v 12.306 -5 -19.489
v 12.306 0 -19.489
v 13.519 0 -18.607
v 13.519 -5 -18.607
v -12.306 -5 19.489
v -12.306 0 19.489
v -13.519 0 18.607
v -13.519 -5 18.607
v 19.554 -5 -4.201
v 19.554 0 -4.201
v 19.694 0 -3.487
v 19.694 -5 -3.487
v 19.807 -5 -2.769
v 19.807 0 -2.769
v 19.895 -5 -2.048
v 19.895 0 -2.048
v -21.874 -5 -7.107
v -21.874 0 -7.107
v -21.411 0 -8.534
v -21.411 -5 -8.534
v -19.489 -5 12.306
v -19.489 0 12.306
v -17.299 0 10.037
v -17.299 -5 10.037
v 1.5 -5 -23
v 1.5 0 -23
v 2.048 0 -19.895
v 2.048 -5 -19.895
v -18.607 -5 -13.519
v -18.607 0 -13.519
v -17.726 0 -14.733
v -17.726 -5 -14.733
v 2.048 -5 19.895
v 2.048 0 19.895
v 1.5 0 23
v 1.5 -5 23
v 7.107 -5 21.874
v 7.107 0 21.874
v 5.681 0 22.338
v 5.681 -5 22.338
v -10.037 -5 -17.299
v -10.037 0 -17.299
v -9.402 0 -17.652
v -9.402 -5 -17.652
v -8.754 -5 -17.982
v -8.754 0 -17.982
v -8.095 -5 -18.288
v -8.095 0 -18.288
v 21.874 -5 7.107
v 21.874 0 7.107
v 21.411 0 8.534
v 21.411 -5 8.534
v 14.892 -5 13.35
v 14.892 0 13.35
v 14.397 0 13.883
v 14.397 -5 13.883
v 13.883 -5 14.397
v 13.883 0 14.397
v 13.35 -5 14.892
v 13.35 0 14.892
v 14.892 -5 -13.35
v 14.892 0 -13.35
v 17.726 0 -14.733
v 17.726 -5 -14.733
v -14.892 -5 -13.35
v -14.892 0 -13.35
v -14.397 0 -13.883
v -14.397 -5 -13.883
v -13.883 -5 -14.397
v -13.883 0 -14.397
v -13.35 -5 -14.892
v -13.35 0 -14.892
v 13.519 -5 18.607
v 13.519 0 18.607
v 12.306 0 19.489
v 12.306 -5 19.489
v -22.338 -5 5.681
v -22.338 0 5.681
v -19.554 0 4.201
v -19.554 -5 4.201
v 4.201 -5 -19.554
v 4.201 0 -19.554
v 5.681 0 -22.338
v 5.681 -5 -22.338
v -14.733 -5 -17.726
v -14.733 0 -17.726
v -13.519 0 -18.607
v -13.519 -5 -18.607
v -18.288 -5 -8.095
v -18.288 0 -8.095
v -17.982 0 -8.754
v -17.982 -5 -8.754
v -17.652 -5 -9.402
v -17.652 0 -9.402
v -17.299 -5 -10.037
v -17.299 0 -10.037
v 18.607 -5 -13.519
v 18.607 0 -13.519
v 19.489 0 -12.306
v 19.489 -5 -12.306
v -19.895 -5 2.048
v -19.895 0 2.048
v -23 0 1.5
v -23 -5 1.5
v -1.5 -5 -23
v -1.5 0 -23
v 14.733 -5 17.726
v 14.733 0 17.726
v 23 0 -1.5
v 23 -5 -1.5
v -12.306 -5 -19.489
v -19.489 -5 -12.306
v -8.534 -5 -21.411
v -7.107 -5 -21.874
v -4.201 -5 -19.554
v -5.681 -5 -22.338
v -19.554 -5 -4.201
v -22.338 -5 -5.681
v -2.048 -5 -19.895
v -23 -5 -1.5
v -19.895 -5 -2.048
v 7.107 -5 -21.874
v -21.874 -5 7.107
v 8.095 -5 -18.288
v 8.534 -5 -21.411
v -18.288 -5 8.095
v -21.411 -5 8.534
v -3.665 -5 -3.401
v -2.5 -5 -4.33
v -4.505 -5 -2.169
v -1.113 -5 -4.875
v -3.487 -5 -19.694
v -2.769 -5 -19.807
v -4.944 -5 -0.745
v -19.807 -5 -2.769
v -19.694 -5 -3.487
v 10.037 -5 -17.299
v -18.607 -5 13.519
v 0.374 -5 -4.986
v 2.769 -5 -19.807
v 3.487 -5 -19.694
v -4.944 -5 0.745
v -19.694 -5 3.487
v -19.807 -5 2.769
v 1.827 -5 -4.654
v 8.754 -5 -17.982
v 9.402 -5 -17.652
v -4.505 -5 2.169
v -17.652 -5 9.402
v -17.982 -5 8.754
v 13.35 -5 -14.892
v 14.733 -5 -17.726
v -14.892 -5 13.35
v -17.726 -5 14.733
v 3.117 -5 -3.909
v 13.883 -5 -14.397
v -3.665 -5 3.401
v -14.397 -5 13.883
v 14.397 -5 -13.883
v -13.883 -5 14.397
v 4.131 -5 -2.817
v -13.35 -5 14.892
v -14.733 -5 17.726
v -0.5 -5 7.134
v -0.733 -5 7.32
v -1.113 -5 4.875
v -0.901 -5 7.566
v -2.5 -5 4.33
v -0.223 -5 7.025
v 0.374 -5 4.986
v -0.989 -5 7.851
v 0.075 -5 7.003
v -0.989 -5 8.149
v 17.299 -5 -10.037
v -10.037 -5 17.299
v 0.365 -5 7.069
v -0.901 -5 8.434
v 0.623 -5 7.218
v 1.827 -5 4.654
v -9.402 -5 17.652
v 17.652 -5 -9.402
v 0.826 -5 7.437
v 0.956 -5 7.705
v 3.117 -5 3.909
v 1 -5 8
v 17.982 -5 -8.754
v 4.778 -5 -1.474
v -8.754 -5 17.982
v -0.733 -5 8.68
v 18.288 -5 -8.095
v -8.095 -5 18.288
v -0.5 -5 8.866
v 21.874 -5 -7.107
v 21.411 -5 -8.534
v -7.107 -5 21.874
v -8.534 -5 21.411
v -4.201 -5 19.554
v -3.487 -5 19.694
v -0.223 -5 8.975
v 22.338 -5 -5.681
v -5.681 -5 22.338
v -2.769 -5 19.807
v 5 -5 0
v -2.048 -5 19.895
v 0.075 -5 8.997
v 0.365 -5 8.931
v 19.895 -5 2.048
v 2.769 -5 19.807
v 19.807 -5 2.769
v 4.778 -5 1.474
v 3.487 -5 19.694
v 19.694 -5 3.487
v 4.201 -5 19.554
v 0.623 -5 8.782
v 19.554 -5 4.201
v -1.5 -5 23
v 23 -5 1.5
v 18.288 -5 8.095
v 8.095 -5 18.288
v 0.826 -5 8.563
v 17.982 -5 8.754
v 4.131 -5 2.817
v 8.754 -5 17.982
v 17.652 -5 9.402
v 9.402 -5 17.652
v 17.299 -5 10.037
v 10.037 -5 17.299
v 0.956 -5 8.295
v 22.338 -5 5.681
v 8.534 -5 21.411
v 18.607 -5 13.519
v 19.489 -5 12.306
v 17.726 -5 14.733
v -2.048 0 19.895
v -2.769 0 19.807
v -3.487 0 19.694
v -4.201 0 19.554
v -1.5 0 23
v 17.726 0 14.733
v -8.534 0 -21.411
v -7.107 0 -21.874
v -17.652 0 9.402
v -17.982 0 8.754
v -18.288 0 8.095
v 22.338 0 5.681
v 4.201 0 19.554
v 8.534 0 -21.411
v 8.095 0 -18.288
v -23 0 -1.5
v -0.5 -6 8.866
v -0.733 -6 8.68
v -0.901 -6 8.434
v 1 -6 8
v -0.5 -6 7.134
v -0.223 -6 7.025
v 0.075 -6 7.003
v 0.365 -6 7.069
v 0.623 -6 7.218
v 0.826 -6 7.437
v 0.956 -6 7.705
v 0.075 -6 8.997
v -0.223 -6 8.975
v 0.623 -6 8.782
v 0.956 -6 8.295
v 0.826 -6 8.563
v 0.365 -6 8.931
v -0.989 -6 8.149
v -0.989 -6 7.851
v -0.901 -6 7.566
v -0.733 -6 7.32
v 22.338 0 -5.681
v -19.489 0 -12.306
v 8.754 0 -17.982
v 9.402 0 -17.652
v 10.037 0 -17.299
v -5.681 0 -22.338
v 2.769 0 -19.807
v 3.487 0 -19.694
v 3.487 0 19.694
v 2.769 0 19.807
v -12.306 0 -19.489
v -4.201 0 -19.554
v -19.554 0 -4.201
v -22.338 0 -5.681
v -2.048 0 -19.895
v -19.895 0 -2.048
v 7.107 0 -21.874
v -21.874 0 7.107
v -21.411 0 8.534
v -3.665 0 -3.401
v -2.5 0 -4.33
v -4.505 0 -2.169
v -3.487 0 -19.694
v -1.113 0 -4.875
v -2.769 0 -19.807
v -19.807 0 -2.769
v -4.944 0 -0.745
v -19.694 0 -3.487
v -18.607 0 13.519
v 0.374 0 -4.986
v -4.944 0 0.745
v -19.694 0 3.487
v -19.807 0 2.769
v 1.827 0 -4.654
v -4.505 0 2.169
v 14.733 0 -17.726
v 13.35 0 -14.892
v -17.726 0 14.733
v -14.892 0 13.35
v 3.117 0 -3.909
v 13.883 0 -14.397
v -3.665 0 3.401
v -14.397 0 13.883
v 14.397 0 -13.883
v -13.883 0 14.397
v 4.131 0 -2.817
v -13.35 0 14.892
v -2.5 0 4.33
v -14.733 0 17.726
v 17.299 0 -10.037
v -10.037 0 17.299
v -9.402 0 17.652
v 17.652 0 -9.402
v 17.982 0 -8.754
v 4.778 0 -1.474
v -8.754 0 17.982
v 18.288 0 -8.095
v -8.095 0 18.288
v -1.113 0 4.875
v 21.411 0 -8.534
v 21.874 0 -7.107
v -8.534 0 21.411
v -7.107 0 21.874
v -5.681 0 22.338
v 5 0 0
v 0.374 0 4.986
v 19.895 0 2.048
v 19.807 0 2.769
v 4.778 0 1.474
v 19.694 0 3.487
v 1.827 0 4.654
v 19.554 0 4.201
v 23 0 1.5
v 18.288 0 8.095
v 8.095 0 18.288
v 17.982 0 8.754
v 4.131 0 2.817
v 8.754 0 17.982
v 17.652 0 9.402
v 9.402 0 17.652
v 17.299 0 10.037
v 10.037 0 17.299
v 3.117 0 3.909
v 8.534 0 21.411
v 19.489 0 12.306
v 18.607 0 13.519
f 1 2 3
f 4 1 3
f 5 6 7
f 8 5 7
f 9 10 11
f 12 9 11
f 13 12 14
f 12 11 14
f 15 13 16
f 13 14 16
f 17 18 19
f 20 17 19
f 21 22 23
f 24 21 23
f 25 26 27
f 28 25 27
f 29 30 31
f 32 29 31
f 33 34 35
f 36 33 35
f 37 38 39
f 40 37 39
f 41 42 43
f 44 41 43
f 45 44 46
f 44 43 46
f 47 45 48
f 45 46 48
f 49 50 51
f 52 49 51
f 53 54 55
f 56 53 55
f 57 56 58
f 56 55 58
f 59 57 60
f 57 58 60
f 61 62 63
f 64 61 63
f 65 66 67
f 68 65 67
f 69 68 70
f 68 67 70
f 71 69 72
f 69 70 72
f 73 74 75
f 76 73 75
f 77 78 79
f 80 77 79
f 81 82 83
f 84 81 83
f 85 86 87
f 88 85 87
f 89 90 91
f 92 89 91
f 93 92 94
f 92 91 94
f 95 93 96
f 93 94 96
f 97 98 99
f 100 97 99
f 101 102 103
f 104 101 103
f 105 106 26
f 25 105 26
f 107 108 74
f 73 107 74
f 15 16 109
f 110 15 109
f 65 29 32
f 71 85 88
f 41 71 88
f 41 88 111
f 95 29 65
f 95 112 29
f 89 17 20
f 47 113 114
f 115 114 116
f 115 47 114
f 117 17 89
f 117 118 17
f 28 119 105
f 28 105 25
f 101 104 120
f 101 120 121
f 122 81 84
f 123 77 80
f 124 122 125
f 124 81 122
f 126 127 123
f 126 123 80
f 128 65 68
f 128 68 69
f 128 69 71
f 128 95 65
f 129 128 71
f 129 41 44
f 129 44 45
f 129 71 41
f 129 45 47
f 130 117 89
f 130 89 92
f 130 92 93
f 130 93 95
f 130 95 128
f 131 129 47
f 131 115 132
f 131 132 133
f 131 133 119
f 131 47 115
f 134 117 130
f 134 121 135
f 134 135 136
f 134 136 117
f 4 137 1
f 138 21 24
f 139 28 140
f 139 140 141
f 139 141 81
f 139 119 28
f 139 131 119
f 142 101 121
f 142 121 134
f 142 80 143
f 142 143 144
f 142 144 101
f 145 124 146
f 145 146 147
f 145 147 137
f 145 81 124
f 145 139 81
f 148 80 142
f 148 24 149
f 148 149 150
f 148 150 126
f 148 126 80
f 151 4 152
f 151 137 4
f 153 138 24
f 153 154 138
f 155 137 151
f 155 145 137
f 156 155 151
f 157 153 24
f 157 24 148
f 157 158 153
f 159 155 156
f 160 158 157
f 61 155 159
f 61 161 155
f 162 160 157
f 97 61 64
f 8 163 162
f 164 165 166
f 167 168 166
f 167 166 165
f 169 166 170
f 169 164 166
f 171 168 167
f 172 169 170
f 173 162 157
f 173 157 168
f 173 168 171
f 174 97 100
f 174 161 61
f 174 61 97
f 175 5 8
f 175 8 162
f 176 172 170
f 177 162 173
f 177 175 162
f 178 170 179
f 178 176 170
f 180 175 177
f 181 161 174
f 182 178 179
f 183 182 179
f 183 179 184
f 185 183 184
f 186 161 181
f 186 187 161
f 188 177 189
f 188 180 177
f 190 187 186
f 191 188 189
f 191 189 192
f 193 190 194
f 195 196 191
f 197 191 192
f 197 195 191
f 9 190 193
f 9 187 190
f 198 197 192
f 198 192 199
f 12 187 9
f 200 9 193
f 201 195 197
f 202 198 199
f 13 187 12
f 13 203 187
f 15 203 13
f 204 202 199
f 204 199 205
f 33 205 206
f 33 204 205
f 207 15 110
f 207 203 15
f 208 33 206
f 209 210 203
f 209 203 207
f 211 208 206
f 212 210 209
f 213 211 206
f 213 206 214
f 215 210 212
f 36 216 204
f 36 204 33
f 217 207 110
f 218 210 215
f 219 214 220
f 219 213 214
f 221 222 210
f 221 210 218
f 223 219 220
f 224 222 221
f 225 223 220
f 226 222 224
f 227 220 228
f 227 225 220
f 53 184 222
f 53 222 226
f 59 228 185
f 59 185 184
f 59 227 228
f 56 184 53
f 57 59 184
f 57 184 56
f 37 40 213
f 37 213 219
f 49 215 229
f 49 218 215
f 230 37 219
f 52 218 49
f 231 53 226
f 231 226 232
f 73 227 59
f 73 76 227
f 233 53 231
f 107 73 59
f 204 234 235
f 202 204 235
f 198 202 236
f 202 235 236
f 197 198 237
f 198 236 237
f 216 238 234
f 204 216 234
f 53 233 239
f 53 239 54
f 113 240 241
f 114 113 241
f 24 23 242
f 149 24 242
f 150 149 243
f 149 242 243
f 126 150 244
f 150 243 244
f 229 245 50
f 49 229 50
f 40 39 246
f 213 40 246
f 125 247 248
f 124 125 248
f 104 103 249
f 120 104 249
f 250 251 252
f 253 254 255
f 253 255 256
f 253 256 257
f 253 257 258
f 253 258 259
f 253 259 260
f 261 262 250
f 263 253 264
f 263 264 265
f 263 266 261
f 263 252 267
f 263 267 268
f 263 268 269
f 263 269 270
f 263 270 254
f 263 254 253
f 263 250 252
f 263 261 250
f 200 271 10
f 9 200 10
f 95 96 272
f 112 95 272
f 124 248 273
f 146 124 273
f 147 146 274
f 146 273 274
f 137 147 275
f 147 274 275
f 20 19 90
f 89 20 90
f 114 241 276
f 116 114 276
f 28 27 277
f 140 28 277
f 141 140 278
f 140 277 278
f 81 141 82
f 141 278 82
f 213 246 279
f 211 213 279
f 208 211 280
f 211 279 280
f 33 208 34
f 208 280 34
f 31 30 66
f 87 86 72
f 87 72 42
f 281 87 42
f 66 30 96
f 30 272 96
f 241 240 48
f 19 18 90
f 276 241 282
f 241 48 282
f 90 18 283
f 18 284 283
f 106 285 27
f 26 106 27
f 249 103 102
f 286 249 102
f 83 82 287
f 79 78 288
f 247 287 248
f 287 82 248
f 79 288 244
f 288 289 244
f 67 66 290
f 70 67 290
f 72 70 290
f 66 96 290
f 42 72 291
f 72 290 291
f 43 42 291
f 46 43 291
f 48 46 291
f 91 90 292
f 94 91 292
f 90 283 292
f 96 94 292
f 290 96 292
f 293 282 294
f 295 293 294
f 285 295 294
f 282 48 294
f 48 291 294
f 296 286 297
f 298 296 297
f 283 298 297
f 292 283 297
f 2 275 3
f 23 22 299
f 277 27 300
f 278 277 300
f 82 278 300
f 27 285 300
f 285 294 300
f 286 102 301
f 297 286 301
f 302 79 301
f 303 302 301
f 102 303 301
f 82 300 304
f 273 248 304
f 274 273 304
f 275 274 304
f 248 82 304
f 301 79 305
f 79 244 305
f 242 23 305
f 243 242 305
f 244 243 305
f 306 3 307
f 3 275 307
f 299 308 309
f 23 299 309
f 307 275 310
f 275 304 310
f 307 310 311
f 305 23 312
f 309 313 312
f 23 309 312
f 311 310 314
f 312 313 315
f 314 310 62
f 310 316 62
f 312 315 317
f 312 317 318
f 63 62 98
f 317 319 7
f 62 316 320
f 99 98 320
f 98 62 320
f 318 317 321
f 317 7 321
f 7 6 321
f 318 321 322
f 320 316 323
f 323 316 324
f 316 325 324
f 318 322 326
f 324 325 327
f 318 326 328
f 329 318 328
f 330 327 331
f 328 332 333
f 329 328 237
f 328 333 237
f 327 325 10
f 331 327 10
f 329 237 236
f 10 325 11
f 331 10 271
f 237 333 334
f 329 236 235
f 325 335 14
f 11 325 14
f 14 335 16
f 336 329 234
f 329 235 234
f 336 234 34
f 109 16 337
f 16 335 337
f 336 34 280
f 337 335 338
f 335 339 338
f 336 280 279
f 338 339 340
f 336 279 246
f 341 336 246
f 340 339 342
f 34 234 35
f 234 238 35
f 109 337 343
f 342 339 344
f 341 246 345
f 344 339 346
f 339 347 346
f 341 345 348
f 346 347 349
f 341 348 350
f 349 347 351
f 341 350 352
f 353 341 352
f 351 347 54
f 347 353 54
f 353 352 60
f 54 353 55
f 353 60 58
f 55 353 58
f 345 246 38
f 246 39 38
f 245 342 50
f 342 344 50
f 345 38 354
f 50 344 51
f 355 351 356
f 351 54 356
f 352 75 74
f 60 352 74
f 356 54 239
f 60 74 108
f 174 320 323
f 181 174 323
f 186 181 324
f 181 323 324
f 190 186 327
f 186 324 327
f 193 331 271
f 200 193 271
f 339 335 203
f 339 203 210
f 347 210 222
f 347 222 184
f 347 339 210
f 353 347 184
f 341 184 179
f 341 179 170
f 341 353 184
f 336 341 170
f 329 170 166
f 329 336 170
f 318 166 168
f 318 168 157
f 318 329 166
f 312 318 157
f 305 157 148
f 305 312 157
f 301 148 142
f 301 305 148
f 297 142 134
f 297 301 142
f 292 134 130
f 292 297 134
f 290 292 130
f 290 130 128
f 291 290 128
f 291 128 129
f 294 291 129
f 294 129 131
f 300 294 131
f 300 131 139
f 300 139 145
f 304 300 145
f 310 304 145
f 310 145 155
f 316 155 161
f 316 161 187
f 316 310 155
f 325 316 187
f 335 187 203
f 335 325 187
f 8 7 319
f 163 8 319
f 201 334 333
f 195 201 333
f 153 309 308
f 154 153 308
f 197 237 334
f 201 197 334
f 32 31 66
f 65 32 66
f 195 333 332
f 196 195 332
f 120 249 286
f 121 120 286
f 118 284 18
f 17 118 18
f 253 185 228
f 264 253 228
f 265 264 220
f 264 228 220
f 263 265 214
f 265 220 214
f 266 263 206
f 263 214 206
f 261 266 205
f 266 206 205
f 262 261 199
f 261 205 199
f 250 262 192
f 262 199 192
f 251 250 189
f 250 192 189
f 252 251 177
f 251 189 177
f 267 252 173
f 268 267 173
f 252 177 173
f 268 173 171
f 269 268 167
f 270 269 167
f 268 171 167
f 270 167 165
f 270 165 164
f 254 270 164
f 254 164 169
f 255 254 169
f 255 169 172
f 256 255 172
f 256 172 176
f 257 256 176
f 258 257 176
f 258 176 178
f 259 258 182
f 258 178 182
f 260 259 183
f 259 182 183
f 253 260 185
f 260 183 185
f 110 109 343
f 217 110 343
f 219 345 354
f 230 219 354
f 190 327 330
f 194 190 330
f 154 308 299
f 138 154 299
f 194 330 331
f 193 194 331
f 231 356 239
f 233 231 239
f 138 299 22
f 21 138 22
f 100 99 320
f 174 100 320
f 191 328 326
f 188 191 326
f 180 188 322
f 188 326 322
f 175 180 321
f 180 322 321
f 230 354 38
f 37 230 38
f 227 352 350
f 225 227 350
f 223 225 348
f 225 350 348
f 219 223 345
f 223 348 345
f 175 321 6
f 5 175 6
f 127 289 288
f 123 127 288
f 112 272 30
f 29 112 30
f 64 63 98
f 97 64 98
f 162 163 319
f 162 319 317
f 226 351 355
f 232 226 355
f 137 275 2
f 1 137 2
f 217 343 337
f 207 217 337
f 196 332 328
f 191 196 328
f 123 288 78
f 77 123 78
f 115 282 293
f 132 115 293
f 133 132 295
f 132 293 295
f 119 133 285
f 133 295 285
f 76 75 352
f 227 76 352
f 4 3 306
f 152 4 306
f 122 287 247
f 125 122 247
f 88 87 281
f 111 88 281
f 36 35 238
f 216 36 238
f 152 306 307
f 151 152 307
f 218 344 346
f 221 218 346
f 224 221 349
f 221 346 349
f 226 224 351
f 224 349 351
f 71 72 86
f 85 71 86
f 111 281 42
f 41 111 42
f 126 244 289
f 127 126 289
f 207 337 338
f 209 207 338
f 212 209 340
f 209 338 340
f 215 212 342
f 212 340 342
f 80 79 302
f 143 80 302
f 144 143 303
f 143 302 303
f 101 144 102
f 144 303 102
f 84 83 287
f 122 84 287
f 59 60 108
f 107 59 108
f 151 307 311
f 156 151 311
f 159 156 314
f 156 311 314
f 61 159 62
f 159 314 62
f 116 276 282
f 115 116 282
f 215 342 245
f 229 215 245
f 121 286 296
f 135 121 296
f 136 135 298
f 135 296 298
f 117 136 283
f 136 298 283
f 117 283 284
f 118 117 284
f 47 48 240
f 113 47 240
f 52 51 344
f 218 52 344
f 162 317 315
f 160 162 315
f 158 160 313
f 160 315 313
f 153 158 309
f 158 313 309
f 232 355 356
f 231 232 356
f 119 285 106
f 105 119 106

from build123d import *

# Parameters (mm, degrees)
F0_R     = 5
F1_DEPTH = 5
F2_R     = 1
F3_DEPTH = 1


with BuildPart() as f1:
    # F0 (on Front) → F1 (new body)
    with BuildSketch(Plane.XZ):
        with BuildLine():
            ThreePointArc((19.894917, -2.04751), (19.973712, -1.025102), (20, 0))
            ThreePointArc((20, 0), (19.973712, 1.025102), (19.894917, 2.04751))
            ThreePointArc((19.894917, 2.04751), (19.753767, 3.128689), (19.553905, 4.20057))
            ThreePointArc((19.553905, 4.20057), (19.02113, 6.18034), (18.288475, 8.095165))
            ThreePointArc((18.288475, 8.095165), (17.82013, 9.07981), (17.298822, 10.037468))
            ThreePointArc((17.298822, 10.037468), (16.18034, 11.755705), (14.891829, 13.350409))
            ThreePointArc((14.891829, 13.350409), (14.142136, 14.142136), (13.350409, 14.891829))
            ThreePointArc((13.350409, 14.891829), (11.755705, 16.18034), (10.037468, 17.298822))
            ThreePointArc((10.037468, 17.298822), (9.07981, 17.82013), (8.095165, 18.288475))
            ThreePointArc((8.095165, 18.288475), (6.18034, 19.02113), (4.20057, 19.553905))
            ThreePointArc((4.20057, 19.553905), (3.128689, 19.753767), (2.04751, 19.894917))
            ThreePointArc((2.04751, 19.894917), (0, 20), (-2.04751, 19.894917))
            ThreePointArc((-2.04751, 19.894917), (-3.128689, 19.753767), (-4.20057, 19.553905))
            ThreePointArc((-4.20057, 19.553905), (-6.18034, 19.02113), (-8.095165, 18.288475))
            ThreePointArc((-8.095165, 18.288475), (-9.07981, 17.82013), (-10.037468, 17.298822))
            ThreePointArc((-10.037468, 17.298822), (-11.755705, 16.18034), (-13.350409, 14.891829))
            ThreePointArc((-13.350409, 14.891829), (-14.142136, 14.142136), (-14.891829, 13.350409))
            ThreePointArc((-14.891829, 13.350409), (-16.18034, 11.755705), (-17.298822, 10.037468))
            ThreePointArc((-17.298822, 10.037468), (-17.82013, 9.07981), (-18.288475, 8.095165))
            ThreePointArc((-18.288475, 8.095165), (-19.02113, 6.18034), (-19.553905, 4.20057))
            ThreePointArc((-19.553905, 4.20057), (-19.753767, 3.128689), (-19.894917, 2.04751))
            ThreePointArc((-19.894917, 2.04751), (-20, 0), (-19.894917, -2.04751))
            ThreePointArc((-19.894917, -2.04751), (-19.753767, -3.128689), (-19.553905, -4.20057))
            ThreePointArc((-19.553905, -4.20057), (-19.02113, -6.18034), (-18.288475, -8.095165))
            ThreePointArc((-18.288475, -8.095165), (-17.82013, -9.07981), (-17.298822, -10.037468))
            ThreePointArc((-17.298822, -10.037468), (-16.18034, -11.755705), (-14.891829, -13.350409))
            ThreePointArc((-14.891829, -13.350409), (-14.142136, -14.142136), (-13.350409, -14.891829))
            ThreePointArc((-13.350409, -14.891829), (-11.755705, -16.18034), (-10.037468, -17.298822))
            ThreePointArc((-10.037468, -17.298822), (-9.07981, -17.82013), (-8.095165, -18.288475))
            ThreePointArc((-8.095165, -18.288475), (-6.18034, -19.02113), (-4.20057, -19.553905))
            ThreePointArc((-4.20057, -19.553905), (-3.128689, -19.753767), (-2.04751, -19.894917))
            ThreePointArc((-2.04751, -19.894917), (0, -20), (2.04751, -19.894917))
            ThreePointArc((2.04751, -19.894917), (3.128689, -19.753767), (4.20057, -19.553905))
            ThreePointArc((4.20057, -19.553905), (6.18034, -19.02113), (8.095165, -18.288475))
            ThreePointArc((8.095165, -18.288475), (9.07981, -17.82013), (10.037468, -17.298822))
            ThreePointArc((10.037468, -17.298822), (11.755705, -16.18034), (13.350409, -14.891829))
            ThreePointArc((13.350409, -14.891829), (14.142136, -14.142136), (14.891829, -13.350409))
            ThreePointArc((14.891829, -13.350409), (16.18034, -11.755705), (17.298822, -10.037468))
            ThreePointArc((17.298822, -10.037468), (17.82013, -9.07981), (18.288475, -8.095165))
            ThreePointArc((18.288475, -8.095165), (19.02113, -6.18034), (19.553905, -4.20057))
            ThreePointArc((19.553905, -4.20057), (19.753767, -3.128689), (19.894917, -2.04751))
        make_face()
        Circle(F0_R, mode=Mode.SUBTRACT)
        with BuildLine():
            ThreePointArc((19.894917, 2.04751), (19.973712, 1.025102), (20, 0))
            ThreePointArc((20, 0), (19.973712, -1.025102), (19.894917, -2.04751))
            Line((19.894917, -2.04751), (23, -1.5))
            Line((23, -1.5), (23, 0))
            Line((23, 0), (23, 1.5))
            Line((23, 1.5), (19.894917, 2.04751))
        make_face()
        with BuildLine():
            ThreePointArc((18.288475, 8.095165), (19.02113, 6.18034), (19.553905, 4.20057))
            Line((19.553905, 4.20057), (22.337825, 5.680806))
            Line((22.337825, 5.680806), (21.8743, 7.107391))
            Line((21.8743, 7.107391), (21.410774, 8.533976))
            Line((21.410774, 8.533976), (18.288475, 8.095165))
        make_face()
        with BuildLine():
            Line((22.337825, -5.680806), (19.553905, -4.20057))
            ThreePointArc((19.553905, -4.20057), (19.02113, -6.18034), (18.288475, -8.095165))
            Line((18.288475, -8.095165), (21.410774, -8.533976))
            Line((21.410774, -8.533976), (21.8743, -7.107391))
            Line((21.8743, -7.107391), (22.337825, -5.680806))
        make_face()
        with BuildLine():
            ThreePointArc((14.891829, 13.350409), (16.18034, 11.755705), (17.298822, 10.037468))
            Line((17.298822, 10.037468), (19.489069, 12.305535))
            Line((19.489069, 12.305535), (18.607391, 13.519061))
            Line((18.607391, 13.519061), (17.725713, 14.732586))
            Line((17.725713, 14.732586), (14.891829, 13.350409))
        make_face()
        with BuildLine():
            Line((19.489069, -12.305535), (17.298822, -10.037468))
            ThreePointArc((17.298822, -10.037468), (16.18034, -11.755705), (14.891829, -13.350409))
            Line((14.891829, -13.350409), (17.725713, -14.732586))
            Line((17.725713, -14.732586), (18.607391, -13.519061))
            Line((18.607391, -13.519061), (19.489069, -12.305535))
        make_face()
        with BuildLine():
            ThreePointArc((10.037468, 17.298822), (11.755705, 16.18034), (13.350409, 14.891829))
            Line((13.350409, 14.891829), (14.732586, 17.725713))
            Line((14.732586, 17.725713), (13.519061, 18.607391))
            Line((13.519061, 18.607391), (12.305535, 19.489069))
            Line((12.305535, 19.489069), (10.037468, 17.298822))
        make_face()
        with BuildLine():
            Line((14.732586, -17.725713), (13.350409, -14.891829))
            ThreePointArc((13.350409, -14.891829), (11.755705, -16.18034), (10.037468, -17.298822))
            Line((10.037468, -17.298822), (12.305535, -19.489069))
            Line((12.305535, -19.489069), (13.519061, -18.607391))
            Line((13.519061, -18.607391), (14.732586, -17.725713))
        make_face()
        with BuildLine():
            ThreePointArc((4.20057, 19.553905), (6.18034, 19.02113), (8.095165, 18.288475))
            Line((8.095165, 18.288475), (8.533976, 21.410774))
            Line((8.533976, 21.410774), (7.107391, 21.8743))
            Line((7.107391, 21.8743), (5.680806, 22.337825))
            Line((5.680806, 22.337825), (4.20057, 19.553905))
        make_face()
        with BuildLine():
            Line((8.533976, -21.410774), (8.095165, -18.288475))
            ThreePointArc((8.095165, -18.288475), (6.18034, -19.02113), (4.20057, -19.553905))
            Line((4.20057, -19.553905), (5.680806, -22.337825))
            Line((5.680806, -22.337825), (7.107391, -21.8743))
            Line((7.107391, -21.8743), (8.533976, -21.410774))
        make_face()
        with BuildLine():
            ThreePointArc((-2.04751, 19.894917), (0, 20), (2.04751, 19.894917))
            Line((2.04751, 19.894917), (1.5, 23))
            Line((1.5, 23), (0, 23))
            Line((0, 23), (-1.5, 23))
            Line((-1.5, 23), (-2.04751, 19.894917))
        make_face()
        with BuildLine():
            Line((1.5, -23), (2.04751, -19.894917))
            ThreePointArc((2.04751, -19.894917), (0, -20), (-2.04751, -19.894917))
            Line((-2.04751, -19.894917), (-1.5, -23))
            Line((-1.5, -23), (0, -23))
            Line((0, -23), (1.5, -23))
        make_face()
        with BuildLine():
            ThreePointArc((-8.095165, 18.288475), (-6.18034, 19.02113), (-4.20057, 19.553905))
            Line((-4.20057, 19.553905), (-5.680806, 22.337825))
            Line((-5.680806, 22.337825), (-7.107391, 21.8743))
            Line((-7.107391, 21.8743), (-8.533976, 21.410774))
            Line((-8.533976, 21.410774), (-8.095165, 18.288475))
        make_face()
        with BuildLine():
            Line((-5.680806, -22.337825), (-4.20057, -19.553905))
            ThreePointArc((-4.20057, -19.553905), (-6.18034, -19.02113), (-8.095165, -18.288475))
            Line((-8.095165, -18.288475), (-8.533976, -21.410774))
            Line((-8.533976, -21.410774), (-7.107391, -21.8743))
            Line((-7.107391, -21.8743), (-5.680806, -22.337825))
        make_face()
        with BuildLine():
            ThreePointArc((-13.350409, 14.891829), (-11.755705, 16.18034), (-10.037468, 17.298822))
            Line((-10.037468, 17.298822), (-12.305535, 19.489069))
            Line((-12.305535, 19.489069), (-13.519061, 18.607391))
            Line((-13.519061, 18.607391), (-14.732586, 17.725713))
            Line((-14.732586, 17.725713), (-13.350409, 14.891829))
        make_face()
        with BuildLine():
            Line((-12.305535, -19.489069), (-10.037468, -17.298822))
            ThreePointArc((-10.037468, -17.298822), (-11.755705, -16.18034), (-13.350409, -14.891829))
            Line((-13.350409, -14.891829), (-14.732586, -17.725713))
            Line((-14.732586, -17.725713), (-13.519061, -18.607391))
            Line((-13.519061, -18.607391), (-12.305535, -19.489069))
        make_face()
        with BuildLine():
            ThreePointArc((-17.298822, 10.037468), (-16.18034, 11.755705), (-14.891829, 13.350409))
            Line((-14.891829, 13.350409), (-17.725713, 14.732586))
            Line((-17.725713, 14.732586), (-18.607391, 13.519061))
            Line((-18.607391, 13.519061), (-19.489069, 12.305535))
            Line((-19.489069, 12.305535), (-17.298822, 10.037468))
        make_face()
        with BuildLine():
            Line((-17.725713, -14.732586), (-14.891829, -13.350409))
            ThreePointArc((-14.891829, -13.350409), (-16.18034, -11.755705), (-17.298822, -10.037468))
            Line((-17.298822, -10.037468), (-19.489069, -12.305535))
            Line((-19.489069, -12.305535), (-18.607391, -13.519061))
            Line((-18.607391, -13.519061), (-17.725713, -14.732586))
        make_face()
        with BuildLine():
            ThreePointArc((-19.553905, 4.20057), (-19.02113, 6.18034), (-18.288475, 8.095165))
            Line((-18.288475, 8.095165), (-21.410774, 8.533976))
            Line((-21.410774, 8.533976), (-21.8743, 7.107391))
            Line((-21.8743, 7.107391), (-22.337825, 5.680806))
            Line((-22.337825, 5.680806), (-19.553905, 4.20057))
        make_face()
        with BuildLine():
            Line((-21.410774, -8.533976), (-18.288475, -8.095165))
            ThreePointArc((-18.288475, -8.095165), (-19.02113, -6.18034), (-19.553905, -4.20057))
            Line((-19.553905, -4.20057), (-22.337825, -5.680806))
            Line((-22.337825, -5.680806), (-21.8743, -7.107391))
            Line((-21.8743, -7.107391), (-21.410774, -8.533976))
        make_face()
        with BuildLine():
            ThreePointArc((-19.894917, -2.04751), (-20, 0), (-19.894917, 2.04751))
            Line((-19.894917, 2.04751), (-23, 1.5))
            Line((-23, 1.5), (-23, 0))
            Line((-23, 0), (-23, -1.5))
            Line((-23, -1.5), (-19.894917, -2.04751))
        make_face()
    extrude(amount=F1_DEPTH)

    # F2 (on face) → F3 (join)
    with BuildSketch(Plane.XZ.offset(5)):
        with Locations((0, 8)):
            Circle(F2_R)
    extrude(amount=F3_DEPTH)


solid = f1.part
